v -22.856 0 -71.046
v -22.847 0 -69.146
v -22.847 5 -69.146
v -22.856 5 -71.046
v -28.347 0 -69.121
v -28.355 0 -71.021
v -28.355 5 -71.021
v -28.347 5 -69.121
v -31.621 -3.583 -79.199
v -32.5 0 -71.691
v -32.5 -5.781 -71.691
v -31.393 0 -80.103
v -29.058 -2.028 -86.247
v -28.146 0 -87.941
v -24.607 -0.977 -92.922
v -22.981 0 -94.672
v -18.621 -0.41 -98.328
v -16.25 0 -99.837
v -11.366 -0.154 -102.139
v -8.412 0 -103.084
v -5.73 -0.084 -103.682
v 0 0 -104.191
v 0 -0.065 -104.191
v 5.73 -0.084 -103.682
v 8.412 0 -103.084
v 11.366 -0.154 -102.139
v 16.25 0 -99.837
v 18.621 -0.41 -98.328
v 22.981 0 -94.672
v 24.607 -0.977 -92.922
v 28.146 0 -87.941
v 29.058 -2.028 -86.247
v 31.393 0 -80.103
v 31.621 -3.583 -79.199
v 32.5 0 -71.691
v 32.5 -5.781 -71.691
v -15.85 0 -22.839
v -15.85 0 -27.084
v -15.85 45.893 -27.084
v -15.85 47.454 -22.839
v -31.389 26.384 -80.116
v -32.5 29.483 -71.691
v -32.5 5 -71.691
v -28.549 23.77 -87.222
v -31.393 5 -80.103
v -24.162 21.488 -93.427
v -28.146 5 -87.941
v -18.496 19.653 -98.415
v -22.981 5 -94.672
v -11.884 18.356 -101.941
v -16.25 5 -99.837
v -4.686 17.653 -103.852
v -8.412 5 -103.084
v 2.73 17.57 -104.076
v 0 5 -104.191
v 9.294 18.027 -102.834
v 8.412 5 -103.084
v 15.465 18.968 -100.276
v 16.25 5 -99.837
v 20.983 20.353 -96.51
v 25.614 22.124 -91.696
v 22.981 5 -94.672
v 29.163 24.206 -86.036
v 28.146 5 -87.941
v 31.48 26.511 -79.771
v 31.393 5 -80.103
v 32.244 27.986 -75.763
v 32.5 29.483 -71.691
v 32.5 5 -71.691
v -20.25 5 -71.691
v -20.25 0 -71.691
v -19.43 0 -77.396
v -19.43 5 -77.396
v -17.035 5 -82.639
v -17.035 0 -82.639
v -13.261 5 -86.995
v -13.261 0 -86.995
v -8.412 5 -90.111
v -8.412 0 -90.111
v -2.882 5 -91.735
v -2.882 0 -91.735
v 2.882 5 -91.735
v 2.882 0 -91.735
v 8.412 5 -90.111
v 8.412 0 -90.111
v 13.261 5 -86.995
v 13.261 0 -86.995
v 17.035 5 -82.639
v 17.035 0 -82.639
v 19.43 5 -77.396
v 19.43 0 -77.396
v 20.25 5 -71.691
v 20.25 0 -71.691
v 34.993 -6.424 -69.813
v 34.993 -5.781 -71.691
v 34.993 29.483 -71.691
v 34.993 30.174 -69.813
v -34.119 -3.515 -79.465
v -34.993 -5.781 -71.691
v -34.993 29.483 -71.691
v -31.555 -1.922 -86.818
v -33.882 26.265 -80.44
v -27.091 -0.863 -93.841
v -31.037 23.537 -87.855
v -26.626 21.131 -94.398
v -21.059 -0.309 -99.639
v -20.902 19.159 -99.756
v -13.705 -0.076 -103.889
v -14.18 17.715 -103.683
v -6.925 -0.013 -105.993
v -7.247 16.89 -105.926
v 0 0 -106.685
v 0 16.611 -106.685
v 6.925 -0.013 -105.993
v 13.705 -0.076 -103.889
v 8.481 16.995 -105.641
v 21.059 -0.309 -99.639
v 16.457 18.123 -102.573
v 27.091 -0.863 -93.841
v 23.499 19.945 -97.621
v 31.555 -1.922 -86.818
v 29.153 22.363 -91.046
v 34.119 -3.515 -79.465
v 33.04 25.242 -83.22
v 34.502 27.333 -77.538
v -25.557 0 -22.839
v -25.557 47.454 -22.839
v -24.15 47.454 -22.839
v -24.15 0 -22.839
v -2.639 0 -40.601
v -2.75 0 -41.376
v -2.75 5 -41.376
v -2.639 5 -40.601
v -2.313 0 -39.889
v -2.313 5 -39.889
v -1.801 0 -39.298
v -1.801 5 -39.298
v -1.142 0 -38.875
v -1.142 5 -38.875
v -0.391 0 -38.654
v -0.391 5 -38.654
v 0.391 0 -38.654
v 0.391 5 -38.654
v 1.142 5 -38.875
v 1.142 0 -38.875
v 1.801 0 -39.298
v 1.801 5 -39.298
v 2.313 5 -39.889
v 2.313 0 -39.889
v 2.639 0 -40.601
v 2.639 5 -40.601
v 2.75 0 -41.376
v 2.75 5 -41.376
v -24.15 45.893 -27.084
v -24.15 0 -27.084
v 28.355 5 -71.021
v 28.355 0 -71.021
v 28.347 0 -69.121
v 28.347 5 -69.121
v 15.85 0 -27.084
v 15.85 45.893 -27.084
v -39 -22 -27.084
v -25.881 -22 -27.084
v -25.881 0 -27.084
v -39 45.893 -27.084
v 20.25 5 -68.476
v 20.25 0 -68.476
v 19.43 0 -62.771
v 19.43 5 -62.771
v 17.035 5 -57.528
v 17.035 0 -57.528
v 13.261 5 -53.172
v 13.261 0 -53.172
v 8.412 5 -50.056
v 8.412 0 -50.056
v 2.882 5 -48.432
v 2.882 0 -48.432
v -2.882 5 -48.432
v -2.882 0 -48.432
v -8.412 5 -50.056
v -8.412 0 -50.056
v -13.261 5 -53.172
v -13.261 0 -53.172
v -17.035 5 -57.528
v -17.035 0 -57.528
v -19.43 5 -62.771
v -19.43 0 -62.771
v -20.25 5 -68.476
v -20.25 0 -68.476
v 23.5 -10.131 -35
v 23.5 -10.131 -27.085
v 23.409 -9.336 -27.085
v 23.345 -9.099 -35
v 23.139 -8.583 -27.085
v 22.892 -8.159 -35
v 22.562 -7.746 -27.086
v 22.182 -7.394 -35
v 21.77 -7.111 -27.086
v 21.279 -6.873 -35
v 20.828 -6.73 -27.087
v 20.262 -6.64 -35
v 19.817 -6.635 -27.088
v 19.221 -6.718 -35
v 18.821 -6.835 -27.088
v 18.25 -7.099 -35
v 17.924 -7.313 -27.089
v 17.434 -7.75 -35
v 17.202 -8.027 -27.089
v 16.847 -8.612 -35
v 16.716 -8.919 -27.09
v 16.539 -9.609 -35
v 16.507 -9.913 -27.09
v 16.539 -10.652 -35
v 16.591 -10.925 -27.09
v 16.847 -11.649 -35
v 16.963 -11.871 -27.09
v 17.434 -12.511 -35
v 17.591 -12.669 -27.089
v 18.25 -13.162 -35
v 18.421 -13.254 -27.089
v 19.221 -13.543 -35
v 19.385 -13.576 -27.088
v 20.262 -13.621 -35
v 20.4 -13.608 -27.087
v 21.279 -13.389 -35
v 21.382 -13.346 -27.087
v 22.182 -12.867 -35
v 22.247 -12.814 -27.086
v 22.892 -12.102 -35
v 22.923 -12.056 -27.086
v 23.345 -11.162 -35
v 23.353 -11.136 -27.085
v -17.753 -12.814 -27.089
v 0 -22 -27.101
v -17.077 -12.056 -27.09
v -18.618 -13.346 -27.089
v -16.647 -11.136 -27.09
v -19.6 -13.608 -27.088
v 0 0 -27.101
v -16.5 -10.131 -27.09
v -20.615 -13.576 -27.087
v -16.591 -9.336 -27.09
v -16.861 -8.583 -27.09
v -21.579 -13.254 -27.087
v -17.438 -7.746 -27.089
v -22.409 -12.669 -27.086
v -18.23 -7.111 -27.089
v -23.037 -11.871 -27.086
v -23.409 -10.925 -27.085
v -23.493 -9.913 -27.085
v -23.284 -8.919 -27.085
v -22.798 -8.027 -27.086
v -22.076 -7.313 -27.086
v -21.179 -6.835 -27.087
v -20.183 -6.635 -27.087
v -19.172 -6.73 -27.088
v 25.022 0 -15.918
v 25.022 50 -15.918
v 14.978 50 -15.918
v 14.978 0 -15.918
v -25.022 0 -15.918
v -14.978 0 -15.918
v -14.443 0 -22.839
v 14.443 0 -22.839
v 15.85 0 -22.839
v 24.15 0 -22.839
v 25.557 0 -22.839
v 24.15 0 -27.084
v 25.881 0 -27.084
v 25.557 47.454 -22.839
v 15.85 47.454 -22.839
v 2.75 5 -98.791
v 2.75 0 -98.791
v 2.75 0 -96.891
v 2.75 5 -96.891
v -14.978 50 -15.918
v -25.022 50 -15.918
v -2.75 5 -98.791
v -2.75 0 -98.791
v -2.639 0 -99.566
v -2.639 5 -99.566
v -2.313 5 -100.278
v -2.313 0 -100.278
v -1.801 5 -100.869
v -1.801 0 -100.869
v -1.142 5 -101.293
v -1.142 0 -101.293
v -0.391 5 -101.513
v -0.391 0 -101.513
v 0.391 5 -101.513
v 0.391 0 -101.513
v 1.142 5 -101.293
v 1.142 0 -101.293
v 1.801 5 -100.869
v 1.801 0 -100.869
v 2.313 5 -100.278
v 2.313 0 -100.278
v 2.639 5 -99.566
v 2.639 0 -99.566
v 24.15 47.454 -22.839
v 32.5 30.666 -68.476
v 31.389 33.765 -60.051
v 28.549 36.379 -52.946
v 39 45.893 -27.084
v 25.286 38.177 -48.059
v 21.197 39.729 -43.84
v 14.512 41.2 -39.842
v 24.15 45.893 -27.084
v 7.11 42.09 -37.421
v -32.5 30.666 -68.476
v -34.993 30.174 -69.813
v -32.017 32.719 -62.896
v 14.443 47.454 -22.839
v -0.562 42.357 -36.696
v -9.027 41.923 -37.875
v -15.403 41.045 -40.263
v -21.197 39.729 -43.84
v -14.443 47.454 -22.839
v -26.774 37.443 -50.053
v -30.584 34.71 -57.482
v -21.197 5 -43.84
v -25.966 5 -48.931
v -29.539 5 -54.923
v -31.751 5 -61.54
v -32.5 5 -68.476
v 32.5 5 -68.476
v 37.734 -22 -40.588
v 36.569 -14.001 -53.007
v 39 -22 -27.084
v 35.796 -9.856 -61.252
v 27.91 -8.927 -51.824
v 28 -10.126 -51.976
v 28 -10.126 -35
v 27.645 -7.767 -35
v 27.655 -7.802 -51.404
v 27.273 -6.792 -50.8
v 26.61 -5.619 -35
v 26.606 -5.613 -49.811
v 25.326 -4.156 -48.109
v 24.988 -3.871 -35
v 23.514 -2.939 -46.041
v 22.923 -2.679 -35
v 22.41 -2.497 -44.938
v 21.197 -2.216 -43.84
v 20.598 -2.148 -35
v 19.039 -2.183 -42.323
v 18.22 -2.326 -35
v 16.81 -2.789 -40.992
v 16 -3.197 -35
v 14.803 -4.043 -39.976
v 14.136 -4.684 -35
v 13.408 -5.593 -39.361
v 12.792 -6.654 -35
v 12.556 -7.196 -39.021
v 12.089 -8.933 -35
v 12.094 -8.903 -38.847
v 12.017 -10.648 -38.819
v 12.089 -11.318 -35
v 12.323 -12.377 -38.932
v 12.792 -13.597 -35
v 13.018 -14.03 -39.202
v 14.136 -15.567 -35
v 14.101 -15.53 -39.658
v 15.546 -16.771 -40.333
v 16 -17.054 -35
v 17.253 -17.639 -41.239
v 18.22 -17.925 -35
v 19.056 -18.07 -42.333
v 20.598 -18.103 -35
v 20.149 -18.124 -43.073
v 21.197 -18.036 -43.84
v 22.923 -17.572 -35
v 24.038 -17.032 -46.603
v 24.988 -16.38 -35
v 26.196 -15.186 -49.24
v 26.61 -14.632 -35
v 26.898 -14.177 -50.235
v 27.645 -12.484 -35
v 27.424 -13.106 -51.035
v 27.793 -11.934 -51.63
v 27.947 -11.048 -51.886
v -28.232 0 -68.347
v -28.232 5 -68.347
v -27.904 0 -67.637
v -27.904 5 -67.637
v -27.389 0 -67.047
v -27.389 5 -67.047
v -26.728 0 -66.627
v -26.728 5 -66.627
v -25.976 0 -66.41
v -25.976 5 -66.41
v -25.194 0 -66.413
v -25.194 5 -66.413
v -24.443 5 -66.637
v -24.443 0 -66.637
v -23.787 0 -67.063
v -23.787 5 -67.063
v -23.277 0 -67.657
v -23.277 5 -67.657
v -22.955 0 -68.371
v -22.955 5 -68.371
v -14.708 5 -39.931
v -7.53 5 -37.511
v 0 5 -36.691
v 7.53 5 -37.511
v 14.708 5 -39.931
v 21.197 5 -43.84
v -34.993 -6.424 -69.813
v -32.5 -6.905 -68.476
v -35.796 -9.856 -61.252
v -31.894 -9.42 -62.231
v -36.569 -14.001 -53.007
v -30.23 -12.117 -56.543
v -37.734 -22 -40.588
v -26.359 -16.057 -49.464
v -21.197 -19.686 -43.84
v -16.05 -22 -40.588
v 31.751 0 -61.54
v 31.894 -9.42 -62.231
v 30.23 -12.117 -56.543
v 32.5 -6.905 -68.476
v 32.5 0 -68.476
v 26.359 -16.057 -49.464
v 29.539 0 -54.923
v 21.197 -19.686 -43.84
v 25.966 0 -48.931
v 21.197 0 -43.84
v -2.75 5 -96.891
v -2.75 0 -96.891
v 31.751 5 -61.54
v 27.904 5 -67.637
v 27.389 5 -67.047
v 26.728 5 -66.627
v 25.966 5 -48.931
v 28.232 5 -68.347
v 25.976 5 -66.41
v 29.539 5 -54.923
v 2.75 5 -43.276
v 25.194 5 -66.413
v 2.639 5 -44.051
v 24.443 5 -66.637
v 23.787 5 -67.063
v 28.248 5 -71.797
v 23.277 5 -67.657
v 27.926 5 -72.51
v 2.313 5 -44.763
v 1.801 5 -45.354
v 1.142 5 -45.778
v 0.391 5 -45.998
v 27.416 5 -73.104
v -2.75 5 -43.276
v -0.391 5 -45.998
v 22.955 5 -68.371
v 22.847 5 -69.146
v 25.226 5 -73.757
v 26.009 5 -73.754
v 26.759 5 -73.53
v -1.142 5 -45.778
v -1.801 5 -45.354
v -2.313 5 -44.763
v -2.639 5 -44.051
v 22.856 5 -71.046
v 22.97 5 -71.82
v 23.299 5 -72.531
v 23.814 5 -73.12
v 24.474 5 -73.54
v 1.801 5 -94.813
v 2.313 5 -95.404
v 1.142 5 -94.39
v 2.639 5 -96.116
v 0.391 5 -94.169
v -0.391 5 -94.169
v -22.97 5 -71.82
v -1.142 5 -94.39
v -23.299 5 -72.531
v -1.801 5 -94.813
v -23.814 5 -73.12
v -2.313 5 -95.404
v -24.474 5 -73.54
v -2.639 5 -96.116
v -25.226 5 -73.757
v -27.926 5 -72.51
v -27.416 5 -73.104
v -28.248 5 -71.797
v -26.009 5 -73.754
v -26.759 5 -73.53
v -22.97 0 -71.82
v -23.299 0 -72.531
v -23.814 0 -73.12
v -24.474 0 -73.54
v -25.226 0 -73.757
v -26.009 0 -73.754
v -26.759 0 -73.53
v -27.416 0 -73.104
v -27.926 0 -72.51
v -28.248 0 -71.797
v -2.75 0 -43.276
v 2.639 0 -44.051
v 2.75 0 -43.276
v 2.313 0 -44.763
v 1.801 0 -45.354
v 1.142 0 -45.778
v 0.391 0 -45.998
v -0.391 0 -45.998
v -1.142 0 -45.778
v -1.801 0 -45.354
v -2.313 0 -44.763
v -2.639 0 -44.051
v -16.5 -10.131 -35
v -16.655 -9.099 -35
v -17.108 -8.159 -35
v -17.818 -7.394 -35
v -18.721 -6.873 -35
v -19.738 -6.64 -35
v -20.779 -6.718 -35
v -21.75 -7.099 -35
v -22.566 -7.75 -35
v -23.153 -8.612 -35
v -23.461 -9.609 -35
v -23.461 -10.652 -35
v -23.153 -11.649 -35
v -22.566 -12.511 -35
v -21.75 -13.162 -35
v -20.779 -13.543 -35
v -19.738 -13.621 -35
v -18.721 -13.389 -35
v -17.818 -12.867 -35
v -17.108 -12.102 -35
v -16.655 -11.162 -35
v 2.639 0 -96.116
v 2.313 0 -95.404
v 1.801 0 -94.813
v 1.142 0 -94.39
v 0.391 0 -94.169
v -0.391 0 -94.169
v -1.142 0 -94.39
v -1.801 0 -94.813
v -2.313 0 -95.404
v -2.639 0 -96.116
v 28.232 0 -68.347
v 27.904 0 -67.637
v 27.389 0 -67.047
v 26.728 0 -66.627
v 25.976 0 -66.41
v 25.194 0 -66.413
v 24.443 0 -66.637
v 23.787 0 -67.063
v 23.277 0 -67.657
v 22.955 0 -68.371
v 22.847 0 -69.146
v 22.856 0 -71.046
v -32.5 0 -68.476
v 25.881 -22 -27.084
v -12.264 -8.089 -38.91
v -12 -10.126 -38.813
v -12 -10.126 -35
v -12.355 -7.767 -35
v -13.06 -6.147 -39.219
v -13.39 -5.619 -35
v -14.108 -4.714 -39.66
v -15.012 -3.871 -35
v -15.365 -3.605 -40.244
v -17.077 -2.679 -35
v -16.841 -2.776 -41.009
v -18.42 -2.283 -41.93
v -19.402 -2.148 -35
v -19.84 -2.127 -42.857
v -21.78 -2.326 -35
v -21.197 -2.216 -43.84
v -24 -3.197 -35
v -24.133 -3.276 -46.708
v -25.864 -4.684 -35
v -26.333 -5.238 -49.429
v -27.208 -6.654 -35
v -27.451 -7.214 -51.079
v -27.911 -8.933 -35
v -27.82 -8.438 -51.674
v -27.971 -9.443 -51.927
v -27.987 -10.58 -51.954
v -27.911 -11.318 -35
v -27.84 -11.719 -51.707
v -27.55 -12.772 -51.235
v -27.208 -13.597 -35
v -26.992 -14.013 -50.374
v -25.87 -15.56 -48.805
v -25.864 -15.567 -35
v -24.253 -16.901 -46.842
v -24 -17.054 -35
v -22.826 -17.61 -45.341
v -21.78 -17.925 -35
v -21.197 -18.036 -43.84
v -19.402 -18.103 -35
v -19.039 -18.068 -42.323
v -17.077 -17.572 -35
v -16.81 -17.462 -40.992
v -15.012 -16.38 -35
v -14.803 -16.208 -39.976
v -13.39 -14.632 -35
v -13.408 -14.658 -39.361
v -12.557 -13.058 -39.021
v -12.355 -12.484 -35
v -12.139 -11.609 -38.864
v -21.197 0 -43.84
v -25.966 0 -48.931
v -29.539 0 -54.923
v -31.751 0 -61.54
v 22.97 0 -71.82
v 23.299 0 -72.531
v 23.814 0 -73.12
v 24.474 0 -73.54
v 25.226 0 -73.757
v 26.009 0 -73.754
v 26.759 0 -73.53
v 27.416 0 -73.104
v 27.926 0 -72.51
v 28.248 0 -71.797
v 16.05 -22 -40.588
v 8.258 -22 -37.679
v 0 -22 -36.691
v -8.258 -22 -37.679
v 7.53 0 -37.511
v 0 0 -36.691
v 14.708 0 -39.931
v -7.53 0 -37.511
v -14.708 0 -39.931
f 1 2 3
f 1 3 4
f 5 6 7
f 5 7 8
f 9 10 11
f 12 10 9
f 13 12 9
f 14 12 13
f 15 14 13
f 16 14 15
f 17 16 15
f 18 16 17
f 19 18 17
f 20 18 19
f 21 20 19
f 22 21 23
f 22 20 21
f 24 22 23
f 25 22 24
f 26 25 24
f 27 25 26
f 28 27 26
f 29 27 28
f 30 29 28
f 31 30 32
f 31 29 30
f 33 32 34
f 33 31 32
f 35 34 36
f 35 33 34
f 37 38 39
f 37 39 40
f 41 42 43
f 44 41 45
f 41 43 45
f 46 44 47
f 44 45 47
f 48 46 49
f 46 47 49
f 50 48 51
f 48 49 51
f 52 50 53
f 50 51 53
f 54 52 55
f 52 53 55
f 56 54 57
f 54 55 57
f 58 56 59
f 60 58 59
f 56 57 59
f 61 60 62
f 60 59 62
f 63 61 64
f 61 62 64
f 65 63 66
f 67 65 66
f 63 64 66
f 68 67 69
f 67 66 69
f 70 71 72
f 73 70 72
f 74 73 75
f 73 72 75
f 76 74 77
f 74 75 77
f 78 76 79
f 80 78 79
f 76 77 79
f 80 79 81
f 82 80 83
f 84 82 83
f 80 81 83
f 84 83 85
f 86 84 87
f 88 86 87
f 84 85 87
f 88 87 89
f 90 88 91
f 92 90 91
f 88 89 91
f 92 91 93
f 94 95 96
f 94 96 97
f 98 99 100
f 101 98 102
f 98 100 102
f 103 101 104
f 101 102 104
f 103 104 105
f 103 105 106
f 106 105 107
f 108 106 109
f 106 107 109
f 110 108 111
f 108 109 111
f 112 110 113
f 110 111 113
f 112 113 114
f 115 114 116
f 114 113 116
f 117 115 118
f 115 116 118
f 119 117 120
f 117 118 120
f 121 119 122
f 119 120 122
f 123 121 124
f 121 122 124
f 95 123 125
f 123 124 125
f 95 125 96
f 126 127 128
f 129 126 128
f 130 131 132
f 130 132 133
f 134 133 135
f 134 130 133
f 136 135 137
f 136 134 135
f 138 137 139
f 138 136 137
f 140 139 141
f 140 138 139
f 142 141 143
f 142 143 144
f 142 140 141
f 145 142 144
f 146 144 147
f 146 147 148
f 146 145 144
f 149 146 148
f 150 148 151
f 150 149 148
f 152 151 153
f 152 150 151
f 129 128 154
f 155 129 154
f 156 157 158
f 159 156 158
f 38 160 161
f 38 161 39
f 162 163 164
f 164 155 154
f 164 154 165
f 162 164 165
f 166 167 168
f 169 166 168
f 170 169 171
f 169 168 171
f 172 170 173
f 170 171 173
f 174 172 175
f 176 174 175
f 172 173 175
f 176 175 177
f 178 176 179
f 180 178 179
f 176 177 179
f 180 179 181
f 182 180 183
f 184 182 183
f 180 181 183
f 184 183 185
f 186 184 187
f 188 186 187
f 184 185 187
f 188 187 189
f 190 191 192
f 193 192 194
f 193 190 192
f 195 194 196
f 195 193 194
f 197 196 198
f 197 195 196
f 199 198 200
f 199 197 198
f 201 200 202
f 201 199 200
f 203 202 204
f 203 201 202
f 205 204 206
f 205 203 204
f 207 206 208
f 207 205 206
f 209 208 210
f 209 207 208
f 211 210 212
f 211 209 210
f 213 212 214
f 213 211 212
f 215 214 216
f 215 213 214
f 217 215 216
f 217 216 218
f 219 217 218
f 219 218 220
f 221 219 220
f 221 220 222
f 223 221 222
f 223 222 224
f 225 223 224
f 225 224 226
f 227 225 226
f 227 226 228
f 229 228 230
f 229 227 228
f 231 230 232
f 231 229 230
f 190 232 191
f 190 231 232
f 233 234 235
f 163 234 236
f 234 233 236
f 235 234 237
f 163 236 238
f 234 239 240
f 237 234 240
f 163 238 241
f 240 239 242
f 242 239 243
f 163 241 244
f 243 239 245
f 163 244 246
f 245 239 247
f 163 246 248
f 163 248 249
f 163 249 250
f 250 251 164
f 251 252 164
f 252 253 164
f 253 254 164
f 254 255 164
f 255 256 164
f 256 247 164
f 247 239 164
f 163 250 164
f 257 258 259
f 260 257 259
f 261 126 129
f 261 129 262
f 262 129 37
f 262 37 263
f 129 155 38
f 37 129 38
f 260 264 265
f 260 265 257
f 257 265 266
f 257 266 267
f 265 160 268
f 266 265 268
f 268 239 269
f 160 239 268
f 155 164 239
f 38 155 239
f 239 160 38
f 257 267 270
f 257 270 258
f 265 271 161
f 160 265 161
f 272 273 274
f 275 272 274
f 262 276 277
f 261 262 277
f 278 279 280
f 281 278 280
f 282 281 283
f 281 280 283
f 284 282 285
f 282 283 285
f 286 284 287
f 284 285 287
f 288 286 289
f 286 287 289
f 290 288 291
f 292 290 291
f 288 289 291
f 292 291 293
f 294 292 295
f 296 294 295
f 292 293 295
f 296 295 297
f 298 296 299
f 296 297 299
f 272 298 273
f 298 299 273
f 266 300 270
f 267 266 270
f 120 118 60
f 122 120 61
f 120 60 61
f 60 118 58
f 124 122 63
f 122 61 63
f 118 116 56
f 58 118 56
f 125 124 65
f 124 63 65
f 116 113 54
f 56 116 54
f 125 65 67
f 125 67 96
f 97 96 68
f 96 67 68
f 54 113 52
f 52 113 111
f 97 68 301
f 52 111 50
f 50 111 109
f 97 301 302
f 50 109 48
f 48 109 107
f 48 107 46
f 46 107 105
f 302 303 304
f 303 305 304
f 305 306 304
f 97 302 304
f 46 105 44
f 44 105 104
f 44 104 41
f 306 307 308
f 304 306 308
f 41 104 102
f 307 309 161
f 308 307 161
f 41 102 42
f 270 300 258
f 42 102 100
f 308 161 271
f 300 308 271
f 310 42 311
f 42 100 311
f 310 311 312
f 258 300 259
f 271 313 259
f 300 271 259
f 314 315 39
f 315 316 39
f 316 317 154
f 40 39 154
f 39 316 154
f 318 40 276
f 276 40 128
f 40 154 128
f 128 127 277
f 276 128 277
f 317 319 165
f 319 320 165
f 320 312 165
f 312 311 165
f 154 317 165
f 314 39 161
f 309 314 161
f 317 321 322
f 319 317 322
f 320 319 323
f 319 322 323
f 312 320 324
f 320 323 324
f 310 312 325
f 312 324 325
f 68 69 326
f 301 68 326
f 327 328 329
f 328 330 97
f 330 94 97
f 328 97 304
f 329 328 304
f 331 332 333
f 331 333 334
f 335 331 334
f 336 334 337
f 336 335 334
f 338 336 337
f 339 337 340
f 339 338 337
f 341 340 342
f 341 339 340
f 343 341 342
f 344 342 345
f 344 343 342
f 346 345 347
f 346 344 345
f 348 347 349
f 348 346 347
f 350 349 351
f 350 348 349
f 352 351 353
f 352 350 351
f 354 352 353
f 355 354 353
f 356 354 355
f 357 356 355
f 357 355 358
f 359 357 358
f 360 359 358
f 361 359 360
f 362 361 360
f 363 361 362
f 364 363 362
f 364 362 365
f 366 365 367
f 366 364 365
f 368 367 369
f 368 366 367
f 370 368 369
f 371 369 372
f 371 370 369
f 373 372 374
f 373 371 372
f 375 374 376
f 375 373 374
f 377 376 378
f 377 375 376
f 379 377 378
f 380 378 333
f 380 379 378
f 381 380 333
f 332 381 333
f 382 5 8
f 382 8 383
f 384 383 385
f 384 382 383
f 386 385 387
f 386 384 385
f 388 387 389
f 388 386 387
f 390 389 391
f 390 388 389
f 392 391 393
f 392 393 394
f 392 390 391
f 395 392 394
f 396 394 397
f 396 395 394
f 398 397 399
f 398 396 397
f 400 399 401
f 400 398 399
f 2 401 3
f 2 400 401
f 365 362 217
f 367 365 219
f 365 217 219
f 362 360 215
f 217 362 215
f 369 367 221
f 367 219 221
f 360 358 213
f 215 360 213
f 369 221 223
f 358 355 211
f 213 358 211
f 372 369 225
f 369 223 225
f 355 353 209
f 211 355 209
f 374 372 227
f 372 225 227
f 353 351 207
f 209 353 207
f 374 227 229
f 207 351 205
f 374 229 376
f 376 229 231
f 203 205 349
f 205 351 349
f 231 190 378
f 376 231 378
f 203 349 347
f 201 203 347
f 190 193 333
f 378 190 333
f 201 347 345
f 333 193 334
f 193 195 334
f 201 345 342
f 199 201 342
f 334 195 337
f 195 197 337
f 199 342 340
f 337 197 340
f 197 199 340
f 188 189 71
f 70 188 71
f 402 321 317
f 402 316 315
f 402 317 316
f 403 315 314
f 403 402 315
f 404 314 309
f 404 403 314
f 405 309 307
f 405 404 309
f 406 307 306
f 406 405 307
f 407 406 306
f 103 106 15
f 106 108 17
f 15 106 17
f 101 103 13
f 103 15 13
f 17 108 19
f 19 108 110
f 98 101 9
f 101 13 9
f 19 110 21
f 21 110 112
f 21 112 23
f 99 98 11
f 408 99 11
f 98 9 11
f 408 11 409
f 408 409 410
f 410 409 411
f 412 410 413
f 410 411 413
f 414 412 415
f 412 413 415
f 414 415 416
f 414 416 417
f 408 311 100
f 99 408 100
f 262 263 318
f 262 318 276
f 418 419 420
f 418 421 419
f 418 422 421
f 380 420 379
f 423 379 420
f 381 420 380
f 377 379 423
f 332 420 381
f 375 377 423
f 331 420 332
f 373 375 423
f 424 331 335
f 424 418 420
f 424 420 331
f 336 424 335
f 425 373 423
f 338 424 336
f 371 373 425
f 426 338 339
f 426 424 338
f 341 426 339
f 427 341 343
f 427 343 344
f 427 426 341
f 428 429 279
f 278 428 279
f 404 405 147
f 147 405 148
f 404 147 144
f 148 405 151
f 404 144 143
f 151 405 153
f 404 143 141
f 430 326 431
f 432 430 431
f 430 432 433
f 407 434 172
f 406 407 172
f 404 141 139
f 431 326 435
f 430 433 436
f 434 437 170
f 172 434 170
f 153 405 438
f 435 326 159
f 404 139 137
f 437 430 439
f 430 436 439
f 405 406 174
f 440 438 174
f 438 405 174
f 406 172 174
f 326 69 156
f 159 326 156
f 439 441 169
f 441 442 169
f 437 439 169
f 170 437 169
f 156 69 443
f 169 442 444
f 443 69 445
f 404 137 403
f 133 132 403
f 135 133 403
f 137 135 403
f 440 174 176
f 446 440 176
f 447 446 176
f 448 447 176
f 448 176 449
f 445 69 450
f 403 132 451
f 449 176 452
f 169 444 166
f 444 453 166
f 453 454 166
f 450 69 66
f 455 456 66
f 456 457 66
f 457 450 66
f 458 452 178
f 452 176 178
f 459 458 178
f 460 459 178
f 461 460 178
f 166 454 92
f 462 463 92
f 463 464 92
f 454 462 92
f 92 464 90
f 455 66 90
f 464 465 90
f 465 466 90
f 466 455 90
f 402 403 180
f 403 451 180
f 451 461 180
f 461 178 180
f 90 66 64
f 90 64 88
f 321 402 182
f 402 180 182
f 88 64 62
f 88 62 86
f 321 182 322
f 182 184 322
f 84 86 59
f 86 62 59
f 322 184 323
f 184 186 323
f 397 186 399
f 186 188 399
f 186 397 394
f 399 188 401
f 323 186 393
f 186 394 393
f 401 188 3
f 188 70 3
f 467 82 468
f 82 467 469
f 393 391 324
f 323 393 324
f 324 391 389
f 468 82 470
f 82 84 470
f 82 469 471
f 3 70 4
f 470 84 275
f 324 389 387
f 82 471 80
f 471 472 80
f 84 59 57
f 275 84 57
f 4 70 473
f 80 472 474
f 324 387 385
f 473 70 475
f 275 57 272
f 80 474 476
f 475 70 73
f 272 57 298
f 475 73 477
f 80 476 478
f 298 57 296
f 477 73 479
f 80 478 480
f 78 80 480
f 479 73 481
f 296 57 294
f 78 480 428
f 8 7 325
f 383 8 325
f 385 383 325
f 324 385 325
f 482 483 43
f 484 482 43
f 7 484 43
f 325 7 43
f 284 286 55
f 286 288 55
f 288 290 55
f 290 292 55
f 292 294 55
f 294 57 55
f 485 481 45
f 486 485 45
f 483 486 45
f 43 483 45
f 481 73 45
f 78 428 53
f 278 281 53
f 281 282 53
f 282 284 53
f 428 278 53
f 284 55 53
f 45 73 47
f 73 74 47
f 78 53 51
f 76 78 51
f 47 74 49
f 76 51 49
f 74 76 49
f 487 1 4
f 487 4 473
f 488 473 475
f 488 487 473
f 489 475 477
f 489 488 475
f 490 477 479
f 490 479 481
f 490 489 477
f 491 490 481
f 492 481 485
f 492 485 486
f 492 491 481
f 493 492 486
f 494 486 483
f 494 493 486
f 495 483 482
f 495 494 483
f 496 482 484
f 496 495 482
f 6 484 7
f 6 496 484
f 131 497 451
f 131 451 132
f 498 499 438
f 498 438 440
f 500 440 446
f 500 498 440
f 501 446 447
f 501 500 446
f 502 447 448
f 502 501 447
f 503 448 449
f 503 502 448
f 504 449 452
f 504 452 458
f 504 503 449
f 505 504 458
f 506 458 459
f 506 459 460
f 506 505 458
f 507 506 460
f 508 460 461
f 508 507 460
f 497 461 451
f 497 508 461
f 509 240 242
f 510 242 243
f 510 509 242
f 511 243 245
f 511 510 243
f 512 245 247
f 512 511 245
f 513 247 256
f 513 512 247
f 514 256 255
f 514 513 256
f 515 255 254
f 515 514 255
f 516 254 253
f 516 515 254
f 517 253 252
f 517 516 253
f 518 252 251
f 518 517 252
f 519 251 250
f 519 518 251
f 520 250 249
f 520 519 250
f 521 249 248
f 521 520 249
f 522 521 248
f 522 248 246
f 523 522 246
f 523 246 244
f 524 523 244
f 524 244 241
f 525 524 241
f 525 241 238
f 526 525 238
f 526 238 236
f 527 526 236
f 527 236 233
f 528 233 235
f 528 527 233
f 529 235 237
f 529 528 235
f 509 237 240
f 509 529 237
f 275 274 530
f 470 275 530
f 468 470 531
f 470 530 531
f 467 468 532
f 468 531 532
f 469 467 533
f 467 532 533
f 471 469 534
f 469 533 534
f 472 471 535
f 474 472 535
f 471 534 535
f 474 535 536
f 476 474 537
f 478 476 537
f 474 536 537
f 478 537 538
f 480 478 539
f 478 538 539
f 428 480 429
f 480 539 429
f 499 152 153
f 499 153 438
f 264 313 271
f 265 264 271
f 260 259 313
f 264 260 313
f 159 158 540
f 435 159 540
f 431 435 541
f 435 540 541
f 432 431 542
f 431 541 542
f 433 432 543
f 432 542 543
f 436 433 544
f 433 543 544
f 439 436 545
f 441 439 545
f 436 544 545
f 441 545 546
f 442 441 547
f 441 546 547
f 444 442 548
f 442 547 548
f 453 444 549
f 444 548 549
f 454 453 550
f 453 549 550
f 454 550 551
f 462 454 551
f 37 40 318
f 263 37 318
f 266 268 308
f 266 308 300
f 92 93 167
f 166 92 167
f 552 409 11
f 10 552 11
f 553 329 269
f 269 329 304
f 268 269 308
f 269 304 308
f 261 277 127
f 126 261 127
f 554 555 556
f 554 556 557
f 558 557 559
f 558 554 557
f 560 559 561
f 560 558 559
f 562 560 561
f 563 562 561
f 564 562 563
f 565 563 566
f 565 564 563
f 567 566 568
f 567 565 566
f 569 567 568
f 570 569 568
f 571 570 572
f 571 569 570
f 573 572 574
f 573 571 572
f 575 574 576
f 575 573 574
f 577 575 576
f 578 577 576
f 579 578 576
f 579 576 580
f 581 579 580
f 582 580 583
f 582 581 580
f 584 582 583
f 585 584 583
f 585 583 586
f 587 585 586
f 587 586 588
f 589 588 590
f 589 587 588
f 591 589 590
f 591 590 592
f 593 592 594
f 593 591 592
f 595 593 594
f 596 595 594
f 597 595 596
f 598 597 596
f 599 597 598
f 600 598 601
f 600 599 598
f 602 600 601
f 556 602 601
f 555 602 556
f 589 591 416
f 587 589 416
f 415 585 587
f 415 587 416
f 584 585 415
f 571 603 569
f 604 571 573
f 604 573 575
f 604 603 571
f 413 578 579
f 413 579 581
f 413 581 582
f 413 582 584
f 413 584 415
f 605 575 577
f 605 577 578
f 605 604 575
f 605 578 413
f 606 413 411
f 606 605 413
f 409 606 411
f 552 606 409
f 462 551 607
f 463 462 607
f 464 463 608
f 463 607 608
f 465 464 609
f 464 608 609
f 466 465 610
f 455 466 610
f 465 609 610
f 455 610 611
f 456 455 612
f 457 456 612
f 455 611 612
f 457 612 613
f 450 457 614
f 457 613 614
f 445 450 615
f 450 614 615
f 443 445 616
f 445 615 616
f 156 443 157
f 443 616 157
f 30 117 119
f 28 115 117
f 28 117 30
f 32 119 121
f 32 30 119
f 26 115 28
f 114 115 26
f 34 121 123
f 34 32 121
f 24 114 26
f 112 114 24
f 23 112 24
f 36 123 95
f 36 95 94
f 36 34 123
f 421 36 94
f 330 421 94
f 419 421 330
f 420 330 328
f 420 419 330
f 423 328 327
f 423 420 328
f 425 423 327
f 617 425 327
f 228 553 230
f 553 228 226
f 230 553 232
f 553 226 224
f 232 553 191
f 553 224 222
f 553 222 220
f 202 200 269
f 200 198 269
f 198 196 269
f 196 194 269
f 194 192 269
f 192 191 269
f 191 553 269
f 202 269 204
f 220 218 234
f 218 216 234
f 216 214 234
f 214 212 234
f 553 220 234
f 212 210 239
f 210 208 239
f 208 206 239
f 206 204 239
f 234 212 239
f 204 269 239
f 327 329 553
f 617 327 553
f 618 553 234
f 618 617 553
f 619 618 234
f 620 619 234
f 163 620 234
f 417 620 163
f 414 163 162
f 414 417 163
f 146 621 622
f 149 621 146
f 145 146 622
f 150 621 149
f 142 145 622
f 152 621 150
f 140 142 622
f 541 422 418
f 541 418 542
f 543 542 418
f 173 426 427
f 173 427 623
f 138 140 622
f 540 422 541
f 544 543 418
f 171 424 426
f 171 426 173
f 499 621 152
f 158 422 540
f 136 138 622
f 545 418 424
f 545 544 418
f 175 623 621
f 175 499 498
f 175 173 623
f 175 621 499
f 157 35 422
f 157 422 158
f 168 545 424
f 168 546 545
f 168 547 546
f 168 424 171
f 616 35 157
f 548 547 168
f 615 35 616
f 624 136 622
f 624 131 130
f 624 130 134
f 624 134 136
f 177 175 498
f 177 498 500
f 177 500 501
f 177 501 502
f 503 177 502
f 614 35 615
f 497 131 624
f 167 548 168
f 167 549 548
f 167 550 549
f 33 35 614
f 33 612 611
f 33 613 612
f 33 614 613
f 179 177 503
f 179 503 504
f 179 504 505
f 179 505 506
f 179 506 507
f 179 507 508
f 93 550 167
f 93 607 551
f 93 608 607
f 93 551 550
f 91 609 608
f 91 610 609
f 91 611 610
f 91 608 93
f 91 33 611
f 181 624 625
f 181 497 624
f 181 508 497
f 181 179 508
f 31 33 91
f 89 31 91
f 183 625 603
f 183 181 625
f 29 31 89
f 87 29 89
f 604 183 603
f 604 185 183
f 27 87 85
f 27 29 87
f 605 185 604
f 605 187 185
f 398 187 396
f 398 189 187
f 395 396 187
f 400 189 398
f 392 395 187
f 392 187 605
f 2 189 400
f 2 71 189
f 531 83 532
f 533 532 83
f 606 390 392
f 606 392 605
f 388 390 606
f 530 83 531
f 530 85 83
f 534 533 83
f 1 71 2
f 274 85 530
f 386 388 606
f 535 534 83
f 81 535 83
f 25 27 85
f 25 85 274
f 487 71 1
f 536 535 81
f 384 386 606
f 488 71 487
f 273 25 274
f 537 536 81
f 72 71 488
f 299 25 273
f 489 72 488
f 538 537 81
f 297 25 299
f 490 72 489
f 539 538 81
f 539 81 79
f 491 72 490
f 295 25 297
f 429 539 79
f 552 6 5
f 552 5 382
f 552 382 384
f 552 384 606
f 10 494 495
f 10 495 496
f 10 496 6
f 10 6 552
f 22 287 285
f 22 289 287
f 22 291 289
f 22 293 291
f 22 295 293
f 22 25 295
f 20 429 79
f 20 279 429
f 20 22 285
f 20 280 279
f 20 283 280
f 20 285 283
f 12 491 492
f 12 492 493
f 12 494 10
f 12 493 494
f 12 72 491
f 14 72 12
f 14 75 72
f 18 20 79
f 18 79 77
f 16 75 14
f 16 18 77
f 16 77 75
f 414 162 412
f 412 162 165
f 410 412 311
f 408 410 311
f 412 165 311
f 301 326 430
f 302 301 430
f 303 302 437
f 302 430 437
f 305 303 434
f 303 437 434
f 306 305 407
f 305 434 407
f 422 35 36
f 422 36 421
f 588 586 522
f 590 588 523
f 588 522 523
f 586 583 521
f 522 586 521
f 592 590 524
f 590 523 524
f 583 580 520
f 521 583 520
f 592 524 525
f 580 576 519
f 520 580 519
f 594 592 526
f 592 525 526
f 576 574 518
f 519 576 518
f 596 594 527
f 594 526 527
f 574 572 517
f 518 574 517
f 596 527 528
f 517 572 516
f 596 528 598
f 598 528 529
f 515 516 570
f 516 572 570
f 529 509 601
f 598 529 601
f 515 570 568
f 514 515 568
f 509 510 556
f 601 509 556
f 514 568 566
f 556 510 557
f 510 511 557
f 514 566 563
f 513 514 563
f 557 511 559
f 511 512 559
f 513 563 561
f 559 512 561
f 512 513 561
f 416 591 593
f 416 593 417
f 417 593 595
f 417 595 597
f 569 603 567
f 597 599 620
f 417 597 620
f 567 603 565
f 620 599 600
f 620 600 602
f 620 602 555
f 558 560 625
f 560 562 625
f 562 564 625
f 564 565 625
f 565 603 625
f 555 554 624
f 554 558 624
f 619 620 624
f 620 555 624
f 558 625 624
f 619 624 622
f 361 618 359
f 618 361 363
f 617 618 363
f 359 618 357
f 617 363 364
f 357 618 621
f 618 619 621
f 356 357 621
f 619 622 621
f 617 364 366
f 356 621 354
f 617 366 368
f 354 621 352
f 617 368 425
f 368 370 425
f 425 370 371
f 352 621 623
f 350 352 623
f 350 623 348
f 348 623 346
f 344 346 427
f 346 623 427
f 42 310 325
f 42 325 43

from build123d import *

# Parameters (mm, degrees)
BOSS_EXTRUDE1_DEPTH      = 5
BOSS_EXTRUDE3_DEPTH      = 50
BOSS_EXTRUDE3_DEPTH_BACK = 22
BOSS_EXTRUDE4_DEPTH      = 50
BOSS_EXTRUDE4_DEPTH_BACK = 22
CUT_EXTRUDE3_DEPTH       = 50
SKETCH6_R                = 3.5
CUT_EXTRUDE7_DEPTH       = 74
SKETCH7_R                = 8
CUT_EXTRUDE8_DEPTH       = 35
CUT_EXTRUDE9_DEPTH       = 35


with BuildPart() as part:
    # Sketch1 → Boss-Extrude1 (new body)
    with BuildSketch(Plane(origin=(0, 0, 0), x_dir=(1, 0, 0), z_dir=(0, 1, 0))):
        with BuildLine():
            Line((32.5, 68.476103961), (32.5, 71.691135645))
            ThreePointArc((32.5, 71.691135645), (0, 104.191135645), (-32.5, 71.691135645))
            Line((-32.5, 71.691135645), (-32.5, 68.476103961))
            ThreePointArc((-32.5, 68.476103961), (0, 35.976103961), (32.5, 68.476103961))
        make_face()
        with BuildLine():
            Line((2.75, 43.276103961), (2.75, 41.376103961))
            ThreePointArc((2.75, 41.376103961), (0, 38.626103961), (-2.75, 41.376103961))
            Line((-2.75, 41.376103961), (-2.75, 43.276103961))
            ThreePointArc((-2.75, 43.276103961), (0, 46.026103961), (2.75, 43.276103961))
        make_face(mode=Mode.SUBTRACT)
        with BuildLine():
            ThreePointArc((-20.25, 71.691135645), (0, 91.941135645), (20.25, 71.691135645))
            Line((20.25, 71.691135645), (20.25, 68.476103961))
            ThreePointArc((20.25, 68.476103961), (0, 48.226103961), (-20.25, 68.476103961))
            Line((-20.25, 68.476103961), (-20.25, 71.691135645))
        make_face(mode=Mode.SUBTRACT)
        with BuildLine():
            Line((-28.346988019, 69.121379238), (-28.355451649, 71.021360387))
            ThreePointArc((-28.355451649, 71.021360387), (-25.617728924, 73.783583093), (-22.855506218, 71.045860368))
            Line((-22.855506218, 71.045860368), (-22.847042588, 69.145879219))
            ThreePointArc((-22.847042588, 69.145879219), (-25.584765313, 66.383656513), (-28.346988019, 69.121379238))
        make_face(mode=Mode.SUBTRACT)
        with BuildLine():
            ThreePointArc((22.855506218, 71.045860368), (25.617728924, 73.783583093), (28.355451649, 71.021360387))
            Line((28.355451649, 71.021360387), (28.346988019, 69.121379238))
            ThreePointArc((28.346988019, 69.121379238), (25.584765313, 66.383656513), (22.847042588, 69.145879219))
            Line((22.847042588, 69.145879219), (22.855506218, 71.045860368))
        make_face(mode=Mode.SUBTRACT)
        with BuildLine():
            ThreePointArc((-2.75, 98.791135645), (0, 101.541135645), (2.75, 98.791135645))
            Line((2.75, 98.791135645), (2.75, 96.891135645))
            ThreePointArc((2.75, 96.891135645), (0, 94.141135645), (-2.75, 96.891135645))
            Line((-2.75, 96.891135645), (-2.75, 98.791135645))
        make_face(mode=Mode.SUBTRACT)
    extrude(amount=BOSS_EXTRUDE1_DEPTH)

    # Sketch1<4> → Boss-Extrude3 (add, two sides: drawn at the far end of the back side and taken through both)
    with BuildSketch(Plane(origin=(0, 0, 0), x_dir=(1, 0, 0), z_dir=(0, 1, 0)).offset(-BOSS_EXTRUDE3_DEPTH_BACK)):
        with BuildLine():
            Line((34.993484539, 71.691135645), (34.993484539, 68.476103961))
            ThreePointArc((34.993484539, 68.476103961), (0, 33.482619422), (-34.993484539, 68.476103961))
            Line((-34.993484539, 68.476103961), (-34.993484539, 71.691135645))
            ThreePointArc((-34.993484539, 71.691135645), (0, 106.684620184), (34.993484539, 71.691135645))
        make_face()
        with BuildLine():
            Line((32.5, 71.691135645), (32.5, 68.476103961))
            ThreePointArc((32.5, 68.476103961), (0, 35.976103961), (-32.5, 68.476103961))
            Line((-32.5, 68.476103961), (-32.5, 71.691135645))
            ThreePointArc((-32.5, 71.691135645), (0, 104.191135645), (32.5, 71.691135645))
        make_face(mode=Mode.SUBTRACT)
    extrude(amount=BOSS_EXTRUDE3_DEPTH + BOSS_EXTRUDE3_DEPTH_BACK)

    # Sketch2 → Boss-Extrude4 (add, two sides: drawn at the far end of the back side and taken through both)
    with BuildSketch(Plane(origin=(0, 0, 0), x_dir=(1, 0, 0), z_dir=(0, 1, 0)).offset(-BOSS_EXTRUDE4_DEPTH_BACK)):
        with BuildLine():
            Line((-15.85, 22.838532478), (-14.442663196, 22.838532478))
            Line((-14.442663196, 22.838532478), (-14.977598698, 15.918189547))
            Line((-14.977598698, 15.918189547), (-25.022401302, 15.918189547))
            Line((-25.022401302, 15.918189547), (-25.557336804, 22.838532478))
            Line((-25.557336804, 22.838532478), (-24.15, 22.838532478))
            Line((-24.15, 22.838532478), (-24.15, 27.083619803))
            Line((-24.15, 27.083619803), (-25.25, 27.083619803))
            Line((-25.25, 27.083619803), (-39, 27.083619803))
            Line((-39, 27.083619803), (-34.964708316, 70.119775602))
            ThreePointArc((-34.964708316, 70.119775602), (0, 36.691135645), (34.964708316, 70.119775602))
            Line((34.964708316, 70.119775602), (39, 27.083619803))
            Line((39, 27.083619803), (25.25, 27.083619803))
            Line((25.25, 27.083619803), (24.15, 27.083619803))
            Line((24.15, 27.083619803), (24.15, 22.838532478))
            Line((24.15, 22.838532478), (25.557336804, 22.838532478))
            Line((25.557336804, 22.838532478), (25.022401302, 15.918189547))
            Line((25.022401302, 15.918189547), (14.977598698, 15.918189547))
            Line((14.977598698, 15.918189547), (14.442663196, 22.838532478))
            Line((14.442663196, 22.838532478), (15.85, 22.838532478))
            Line((15.85, 22.838532478), (15.85, 27.083619803))
            Line((15.85, 27.083619803), (14.75, 27.083619803))
            Line((14.75, 27.083619803), (-14.75, 27.083619803))
            Line((-14.75, 27.083619803), (-15.85, 27.083619803))
            Line((-15.85, 27.083619803), (-15.85, 22.838532478))
        make_face()
    extrude(amount=BOSS_EXTRUDE4_DEPTH + BOSS_EXTRUDE4_DEPTH_BACK)

    # Sketch8 → Cut-Extrude3 (cut, symmetric)
    with BuildSketch(Plane(origin=(0, 0, 0), x_dir=(0, 0, -1), z_dir=(1, 0, 0))):
        Polygon((15.918189547, 50), (106.684620184, 50), (106.684620184, 16.610675261), align=None)
        with BuildLine():
            Line((106.684620184, 0), (106.684620184, -22))
            Line((106.684620184, -22), (40.588201897, -22))
            add(Edge.make_bspline(
                [(106.684620184, 0), (69.600838441, -0.610728102), (40.588201897, -22)],
                knots=[0, 0, 0, 1, 1, 1], degree=2))
        make_face()
    extrude(amount=CUT_EXTRUDE3_DEPTH, both=True, mode=Mode.SUBTRACT)

    # Sketch6 → Cut-Extrude7 (cut)
    with BuildSketch(Plane.XY.offset(-70)):
        with Locations((-20, -10.130588175)):
            Circle(SKETCH6_R)
        with Locations((20, -10.130588175)):
            Circle(SKETCH6_R)
    extrude(amount=CUT_EXTRUDE7_DEPTH, mode=Mode.SUBTRACT)

    # Sketch7 → Cut-Extrude8 (cut)
    with BuildSketch(Plane.XY.offset(-70)):
        with Locations((-20, -10.125507159)):
            Circle(SKETCH7_R)
        with Locations((20, -10.125507159)):
            Circle(SKETCH7_R)
    extrude(amount=CUT_EXTRUDE8_DEPTH, mode=Mode.SUBTRACT)

    # Sketch4 → Cut-Extrude9 (cut)
    with BuildSketch(Plane(origin=(0, 0, 0), x_dir=(1, 0, 0), z_dir=(0, 1, 0))):
        Polygon((25.88119751, 27.083619803), (-2e-09, 27.101118051), (-25.88119751, 27.083619803), (-32.125, 22.89108437), (-32.33386562, 13.718189547), (0, 13.918189547), (32.33386562, 13.718189547), (32.125, 22.89108437), align=None)
    extrude(amount=-CUT_EXTRUDE9_DEPTH, mode=Mode.SUBTRACT)


solid = part.part
